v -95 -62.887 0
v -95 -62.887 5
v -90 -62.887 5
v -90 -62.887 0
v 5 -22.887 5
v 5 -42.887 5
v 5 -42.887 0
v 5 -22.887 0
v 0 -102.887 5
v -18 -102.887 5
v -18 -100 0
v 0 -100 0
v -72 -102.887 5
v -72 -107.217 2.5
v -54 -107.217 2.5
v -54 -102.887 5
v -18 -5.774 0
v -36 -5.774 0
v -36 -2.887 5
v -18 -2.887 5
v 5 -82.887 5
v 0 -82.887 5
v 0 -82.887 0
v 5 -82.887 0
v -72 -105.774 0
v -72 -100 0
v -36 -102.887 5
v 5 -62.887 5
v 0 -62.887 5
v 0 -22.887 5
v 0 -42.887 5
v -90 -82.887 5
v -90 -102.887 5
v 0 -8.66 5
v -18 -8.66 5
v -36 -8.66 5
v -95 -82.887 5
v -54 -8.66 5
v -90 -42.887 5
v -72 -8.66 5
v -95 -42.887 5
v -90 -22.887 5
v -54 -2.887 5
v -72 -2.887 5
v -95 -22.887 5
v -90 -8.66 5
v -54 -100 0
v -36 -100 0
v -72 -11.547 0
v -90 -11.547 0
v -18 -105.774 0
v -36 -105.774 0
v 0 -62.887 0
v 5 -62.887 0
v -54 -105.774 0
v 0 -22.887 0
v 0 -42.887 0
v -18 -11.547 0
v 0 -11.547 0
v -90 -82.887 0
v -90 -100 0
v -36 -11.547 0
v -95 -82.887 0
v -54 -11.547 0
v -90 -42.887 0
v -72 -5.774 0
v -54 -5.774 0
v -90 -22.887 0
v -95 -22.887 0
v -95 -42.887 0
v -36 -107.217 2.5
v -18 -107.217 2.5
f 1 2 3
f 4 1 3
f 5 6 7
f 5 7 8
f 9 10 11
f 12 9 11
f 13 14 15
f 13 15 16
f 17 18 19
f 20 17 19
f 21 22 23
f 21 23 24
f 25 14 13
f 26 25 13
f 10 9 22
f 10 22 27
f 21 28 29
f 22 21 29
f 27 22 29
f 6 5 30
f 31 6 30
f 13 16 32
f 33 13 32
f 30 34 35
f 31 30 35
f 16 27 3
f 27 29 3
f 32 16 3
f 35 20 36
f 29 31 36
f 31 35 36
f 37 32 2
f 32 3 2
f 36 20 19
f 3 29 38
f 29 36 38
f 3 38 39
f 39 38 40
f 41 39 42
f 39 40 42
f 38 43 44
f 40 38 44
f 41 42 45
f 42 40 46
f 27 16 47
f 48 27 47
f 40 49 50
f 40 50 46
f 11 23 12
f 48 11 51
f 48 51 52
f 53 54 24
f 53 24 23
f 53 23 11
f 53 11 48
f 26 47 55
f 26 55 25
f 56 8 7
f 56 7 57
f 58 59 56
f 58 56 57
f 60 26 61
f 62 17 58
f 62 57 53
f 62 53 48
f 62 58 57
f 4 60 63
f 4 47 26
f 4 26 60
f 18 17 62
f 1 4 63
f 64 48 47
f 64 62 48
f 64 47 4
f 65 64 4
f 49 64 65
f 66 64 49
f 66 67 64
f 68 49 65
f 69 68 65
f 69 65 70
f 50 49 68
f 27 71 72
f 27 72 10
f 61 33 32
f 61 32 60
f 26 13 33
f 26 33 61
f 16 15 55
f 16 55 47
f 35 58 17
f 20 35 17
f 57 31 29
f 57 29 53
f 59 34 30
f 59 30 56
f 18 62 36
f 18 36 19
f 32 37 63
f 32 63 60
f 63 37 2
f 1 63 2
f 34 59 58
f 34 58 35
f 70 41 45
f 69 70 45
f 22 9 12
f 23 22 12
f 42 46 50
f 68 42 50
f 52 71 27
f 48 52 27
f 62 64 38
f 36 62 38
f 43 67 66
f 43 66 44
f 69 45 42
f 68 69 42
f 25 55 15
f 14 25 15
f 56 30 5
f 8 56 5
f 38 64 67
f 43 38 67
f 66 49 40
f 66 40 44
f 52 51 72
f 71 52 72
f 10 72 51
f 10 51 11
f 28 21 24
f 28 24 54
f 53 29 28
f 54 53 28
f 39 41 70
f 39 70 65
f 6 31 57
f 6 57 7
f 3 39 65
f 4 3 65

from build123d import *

# Parameters (mm, degrees)
ESQUISSE1_W             = 90
ESQUISSE1_H             = 100
BOSS_EXTRU_1_DEPTH      = 5
ENL_V_MAT_EXTRU_1_DEPTH = 135.629120178
BOSS_EXTRU_2_DEPTH      = 90
ESQUISSE10_W            = 18
ESQUISSE10_H            = 15
BOSS_EXTRU_4_DEPTH      = 5
ENL_V_MAT_EXTRU_3_DEPTH = 126.676901627
ESQUISSE12_W            = 18
ESQUISSE12_H            = 12
BOSS_EXTRU_5_DEPTH      = 5
ENL_V_MAT_EXTRU_4_DEPTH = 134.240384268
ESQUISSE14_W            = 5
ESQUISSE14_H            = 20
BOSS_EXTRU_6_DEPTH      = 5


with BuildPart() as part:
    # Esquisse1 → Boss.-Extru.1 (new body)
    with BuildSketch(Plane.XY):
        with Locations((-45, -50)):
            Rectangle(ESQUISSE1_W, ESQUISSE1_H)
    extrude(amount=BOSS_EXTRU_1_DEPTH)

    # Esquisse2 → Enlèv. mat.-Extru.1 (cut, through all)
    with BuildSketch(Plane(origin=(0, 0, 0), x_dir=(0, 0, -1), z_dir=(1, 0, 0))):
        Polygon((0, -11.547005384), (-5, -8.660254038), (-5, 0), (0, 0), align=None)
    extrude(amount=-ENL_V_MAT_EXTRU_1_DEPTH, mode=Mode.SUBTRACT)

    # Esquisse3 → Boss.-Extru.2 (add, through all)
    with BuildSketch(Plane(origin=(0, 0, 0), x_dir=(0, 0, -1), z_dir=(1, 0, 0))):
        Polygon((-5, -100), (-5, -102.886751346), (0, -100), align=None)
    extrude(amount=-BOSS_EXTRU_2_DEPTH)

    # Esquisse10 → Boss.-Extru.4 (add, through all)
    with BuildSketch(Plane(origin=(0, 0, 0), x_dir=(-1, 0, 0), z_dir=(0, 0, -1))):
        with Locations((27, -4.047005384)):
            Rectangle(ESQUISSE10_W, ESQUISSE10_H)
        with Locations((63, -4.047005384)):
            Rectangle(ESQUISSE10_W, ESQUISSE10_H)
    extrude(amount=-BOSS_EXTRU_4_DEPTH)

    # Esquisse11 → Enlèv. mat.-Extru.3 (cut, through all)
    with BuildSketch(Plane(origin=(-18, 0, 0), x_dir=(0, 0, -1), z_dir=(1, 0, 0))):
        Polygon((0, -5.773502692), (-5, -2.886751346), (-5, 3.452994616), (0, 3.452994616), align=None)
    extrude(amount=-ENL_V_MAT_EXTRU_3_DEPTH, mode=Mode.SUBTRACT)

    # Esquisse12 → Boss.-Extru.5 (add)
    with BuildSketch(Plane(origin=(0, 0, 0), x_dir=(-1, 0, 0), z_dir=(0, 0, -1))):
        with Locations((27, -106)):
            Rectangle(ESQUISSE12_W, ESQUISSE12_H)
        with Locations((63, -106)):
            Rectangle(ESQUISSE12_W, ESQUISSE12_H)
    extrude(amount=-BOSS_EXTRU_5_DEPTH)

    # Esquisse13 → Enlèv. mat.-Extru.4 (cut, through all)
    with BuildSketch(Plane(origin=(-18, 0, 0), x_dir=(0, 0, -1), z_dir=(1, 0, 0))):
        Polygon((-2.5, -107.216878365), (-5, -102.886751346), (-5, -112), (0, -112), (0, -105.773502692), align=None)
    extrude(amount=-ENL_V_MAT_EXTRU_4_DEPTH, mode=Mode.SUBTRACT)

    # Esquisse14 → Boss.-Extru.6 (add, through all)
    with BuildSketch(Plane.XY.offset(5)):
        with Locations((2.5, -32.886751346)):
            Rectangle(ESQUISSE14_W, ESQUISSE14_H)
        with Locations((2.5, -72.886751346)):
            Rectangle(ESQUISSE14_W, ESQUISSE14_H)
        with Locations((-92.5, -72.886751346)):
            Rectangle(ESQUISSE14_W, ESQUISSE14_H)
        with Locations((-92.5, -32.886751346)):
            Rectangle(ESQUISSE14_W, ESQUISSE14_H)
    extrude(amount=-BOSS_EXTRU_6_DEPTH)


solid = part.part
